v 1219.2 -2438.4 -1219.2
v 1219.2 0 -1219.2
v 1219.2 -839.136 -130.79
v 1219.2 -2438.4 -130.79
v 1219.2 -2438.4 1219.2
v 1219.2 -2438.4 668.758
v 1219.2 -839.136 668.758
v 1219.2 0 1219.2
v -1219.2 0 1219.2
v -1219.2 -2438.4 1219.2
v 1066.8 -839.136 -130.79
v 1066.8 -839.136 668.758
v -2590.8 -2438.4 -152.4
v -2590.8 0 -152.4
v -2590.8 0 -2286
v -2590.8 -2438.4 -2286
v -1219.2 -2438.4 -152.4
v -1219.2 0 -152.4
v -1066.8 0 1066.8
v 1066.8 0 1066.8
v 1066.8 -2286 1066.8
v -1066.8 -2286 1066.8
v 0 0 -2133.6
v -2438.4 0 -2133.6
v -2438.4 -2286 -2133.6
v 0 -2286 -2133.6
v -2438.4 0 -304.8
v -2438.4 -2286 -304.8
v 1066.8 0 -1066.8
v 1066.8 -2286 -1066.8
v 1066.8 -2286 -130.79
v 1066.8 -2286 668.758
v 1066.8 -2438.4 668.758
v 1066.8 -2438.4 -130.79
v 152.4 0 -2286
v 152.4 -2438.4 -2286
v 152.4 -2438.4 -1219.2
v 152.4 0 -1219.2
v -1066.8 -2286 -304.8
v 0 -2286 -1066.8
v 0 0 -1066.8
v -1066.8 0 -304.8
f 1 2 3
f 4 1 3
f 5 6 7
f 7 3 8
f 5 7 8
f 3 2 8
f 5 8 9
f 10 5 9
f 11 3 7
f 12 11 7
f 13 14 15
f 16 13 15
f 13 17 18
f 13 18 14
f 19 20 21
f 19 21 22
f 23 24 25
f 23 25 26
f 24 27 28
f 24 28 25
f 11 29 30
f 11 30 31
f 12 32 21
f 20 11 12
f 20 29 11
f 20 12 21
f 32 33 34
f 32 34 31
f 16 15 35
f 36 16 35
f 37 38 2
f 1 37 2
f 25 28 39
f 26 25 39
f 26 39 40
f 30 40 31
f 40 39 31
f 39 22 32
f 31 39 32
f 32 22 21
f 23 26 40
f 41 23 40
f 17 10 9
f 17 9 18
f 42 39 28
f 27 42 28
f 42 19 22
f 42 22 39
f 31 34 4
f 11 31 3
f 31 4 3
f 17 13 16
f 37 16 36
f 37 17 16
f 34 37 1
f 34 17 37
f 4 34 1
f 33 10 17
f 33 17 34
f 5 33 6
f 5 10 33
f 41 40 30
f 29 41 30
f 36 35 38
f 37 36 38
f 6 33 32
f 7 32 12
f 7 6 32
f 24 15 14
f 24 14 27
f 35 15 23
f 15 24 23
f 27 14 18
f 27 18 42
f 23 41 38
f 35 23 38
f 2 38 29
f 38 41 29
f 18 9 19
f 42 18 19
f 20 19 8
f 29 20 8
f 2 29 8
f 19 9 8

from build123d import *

# Parameters (mm, degrees)
F1_DEPTH = 2438.4
F2_T     = -152.4
F3_W     = 1599.2642339706
F3_H     = 799.5484024286
F4_DEPTH = 152.4


with BuildPart() as f1:
    # F0 (on Front) → F1 (new body)
    with BuildSketch(Plane.XZ):
        Polygon((152.4, -1219.2), (1219.2, -1219.2), (1219.2, 1219.2), (-1219.2, 1219.2), (-1219.2, -152.4), (-2590.8, -152.4), (-2590.8, -2286), (152.4, -2286), align=None)
    extrude(amount=F1_DEPTH)

    # F2
    f2_openings = [f1.faces().sort_by_distance(p)[0] for p in [
        (-614.908315, 0, -593.332584),
    ]]
    offset(amount=F2_T, openings=f2_openings, kind=Kind.INTERSECTION)

    # F3 (on face) → F4 (cut)
    with BuildSketch(Plane.YZ.offset(1219.2)):
        with Locations((-1638.7678830147, 268.9837738872)):
            Rectangle(F3_W, F3_H)
    extrude(amount=-F4_DEPTH, mode=Mode.SUBTRACT)


solid = f1.part
